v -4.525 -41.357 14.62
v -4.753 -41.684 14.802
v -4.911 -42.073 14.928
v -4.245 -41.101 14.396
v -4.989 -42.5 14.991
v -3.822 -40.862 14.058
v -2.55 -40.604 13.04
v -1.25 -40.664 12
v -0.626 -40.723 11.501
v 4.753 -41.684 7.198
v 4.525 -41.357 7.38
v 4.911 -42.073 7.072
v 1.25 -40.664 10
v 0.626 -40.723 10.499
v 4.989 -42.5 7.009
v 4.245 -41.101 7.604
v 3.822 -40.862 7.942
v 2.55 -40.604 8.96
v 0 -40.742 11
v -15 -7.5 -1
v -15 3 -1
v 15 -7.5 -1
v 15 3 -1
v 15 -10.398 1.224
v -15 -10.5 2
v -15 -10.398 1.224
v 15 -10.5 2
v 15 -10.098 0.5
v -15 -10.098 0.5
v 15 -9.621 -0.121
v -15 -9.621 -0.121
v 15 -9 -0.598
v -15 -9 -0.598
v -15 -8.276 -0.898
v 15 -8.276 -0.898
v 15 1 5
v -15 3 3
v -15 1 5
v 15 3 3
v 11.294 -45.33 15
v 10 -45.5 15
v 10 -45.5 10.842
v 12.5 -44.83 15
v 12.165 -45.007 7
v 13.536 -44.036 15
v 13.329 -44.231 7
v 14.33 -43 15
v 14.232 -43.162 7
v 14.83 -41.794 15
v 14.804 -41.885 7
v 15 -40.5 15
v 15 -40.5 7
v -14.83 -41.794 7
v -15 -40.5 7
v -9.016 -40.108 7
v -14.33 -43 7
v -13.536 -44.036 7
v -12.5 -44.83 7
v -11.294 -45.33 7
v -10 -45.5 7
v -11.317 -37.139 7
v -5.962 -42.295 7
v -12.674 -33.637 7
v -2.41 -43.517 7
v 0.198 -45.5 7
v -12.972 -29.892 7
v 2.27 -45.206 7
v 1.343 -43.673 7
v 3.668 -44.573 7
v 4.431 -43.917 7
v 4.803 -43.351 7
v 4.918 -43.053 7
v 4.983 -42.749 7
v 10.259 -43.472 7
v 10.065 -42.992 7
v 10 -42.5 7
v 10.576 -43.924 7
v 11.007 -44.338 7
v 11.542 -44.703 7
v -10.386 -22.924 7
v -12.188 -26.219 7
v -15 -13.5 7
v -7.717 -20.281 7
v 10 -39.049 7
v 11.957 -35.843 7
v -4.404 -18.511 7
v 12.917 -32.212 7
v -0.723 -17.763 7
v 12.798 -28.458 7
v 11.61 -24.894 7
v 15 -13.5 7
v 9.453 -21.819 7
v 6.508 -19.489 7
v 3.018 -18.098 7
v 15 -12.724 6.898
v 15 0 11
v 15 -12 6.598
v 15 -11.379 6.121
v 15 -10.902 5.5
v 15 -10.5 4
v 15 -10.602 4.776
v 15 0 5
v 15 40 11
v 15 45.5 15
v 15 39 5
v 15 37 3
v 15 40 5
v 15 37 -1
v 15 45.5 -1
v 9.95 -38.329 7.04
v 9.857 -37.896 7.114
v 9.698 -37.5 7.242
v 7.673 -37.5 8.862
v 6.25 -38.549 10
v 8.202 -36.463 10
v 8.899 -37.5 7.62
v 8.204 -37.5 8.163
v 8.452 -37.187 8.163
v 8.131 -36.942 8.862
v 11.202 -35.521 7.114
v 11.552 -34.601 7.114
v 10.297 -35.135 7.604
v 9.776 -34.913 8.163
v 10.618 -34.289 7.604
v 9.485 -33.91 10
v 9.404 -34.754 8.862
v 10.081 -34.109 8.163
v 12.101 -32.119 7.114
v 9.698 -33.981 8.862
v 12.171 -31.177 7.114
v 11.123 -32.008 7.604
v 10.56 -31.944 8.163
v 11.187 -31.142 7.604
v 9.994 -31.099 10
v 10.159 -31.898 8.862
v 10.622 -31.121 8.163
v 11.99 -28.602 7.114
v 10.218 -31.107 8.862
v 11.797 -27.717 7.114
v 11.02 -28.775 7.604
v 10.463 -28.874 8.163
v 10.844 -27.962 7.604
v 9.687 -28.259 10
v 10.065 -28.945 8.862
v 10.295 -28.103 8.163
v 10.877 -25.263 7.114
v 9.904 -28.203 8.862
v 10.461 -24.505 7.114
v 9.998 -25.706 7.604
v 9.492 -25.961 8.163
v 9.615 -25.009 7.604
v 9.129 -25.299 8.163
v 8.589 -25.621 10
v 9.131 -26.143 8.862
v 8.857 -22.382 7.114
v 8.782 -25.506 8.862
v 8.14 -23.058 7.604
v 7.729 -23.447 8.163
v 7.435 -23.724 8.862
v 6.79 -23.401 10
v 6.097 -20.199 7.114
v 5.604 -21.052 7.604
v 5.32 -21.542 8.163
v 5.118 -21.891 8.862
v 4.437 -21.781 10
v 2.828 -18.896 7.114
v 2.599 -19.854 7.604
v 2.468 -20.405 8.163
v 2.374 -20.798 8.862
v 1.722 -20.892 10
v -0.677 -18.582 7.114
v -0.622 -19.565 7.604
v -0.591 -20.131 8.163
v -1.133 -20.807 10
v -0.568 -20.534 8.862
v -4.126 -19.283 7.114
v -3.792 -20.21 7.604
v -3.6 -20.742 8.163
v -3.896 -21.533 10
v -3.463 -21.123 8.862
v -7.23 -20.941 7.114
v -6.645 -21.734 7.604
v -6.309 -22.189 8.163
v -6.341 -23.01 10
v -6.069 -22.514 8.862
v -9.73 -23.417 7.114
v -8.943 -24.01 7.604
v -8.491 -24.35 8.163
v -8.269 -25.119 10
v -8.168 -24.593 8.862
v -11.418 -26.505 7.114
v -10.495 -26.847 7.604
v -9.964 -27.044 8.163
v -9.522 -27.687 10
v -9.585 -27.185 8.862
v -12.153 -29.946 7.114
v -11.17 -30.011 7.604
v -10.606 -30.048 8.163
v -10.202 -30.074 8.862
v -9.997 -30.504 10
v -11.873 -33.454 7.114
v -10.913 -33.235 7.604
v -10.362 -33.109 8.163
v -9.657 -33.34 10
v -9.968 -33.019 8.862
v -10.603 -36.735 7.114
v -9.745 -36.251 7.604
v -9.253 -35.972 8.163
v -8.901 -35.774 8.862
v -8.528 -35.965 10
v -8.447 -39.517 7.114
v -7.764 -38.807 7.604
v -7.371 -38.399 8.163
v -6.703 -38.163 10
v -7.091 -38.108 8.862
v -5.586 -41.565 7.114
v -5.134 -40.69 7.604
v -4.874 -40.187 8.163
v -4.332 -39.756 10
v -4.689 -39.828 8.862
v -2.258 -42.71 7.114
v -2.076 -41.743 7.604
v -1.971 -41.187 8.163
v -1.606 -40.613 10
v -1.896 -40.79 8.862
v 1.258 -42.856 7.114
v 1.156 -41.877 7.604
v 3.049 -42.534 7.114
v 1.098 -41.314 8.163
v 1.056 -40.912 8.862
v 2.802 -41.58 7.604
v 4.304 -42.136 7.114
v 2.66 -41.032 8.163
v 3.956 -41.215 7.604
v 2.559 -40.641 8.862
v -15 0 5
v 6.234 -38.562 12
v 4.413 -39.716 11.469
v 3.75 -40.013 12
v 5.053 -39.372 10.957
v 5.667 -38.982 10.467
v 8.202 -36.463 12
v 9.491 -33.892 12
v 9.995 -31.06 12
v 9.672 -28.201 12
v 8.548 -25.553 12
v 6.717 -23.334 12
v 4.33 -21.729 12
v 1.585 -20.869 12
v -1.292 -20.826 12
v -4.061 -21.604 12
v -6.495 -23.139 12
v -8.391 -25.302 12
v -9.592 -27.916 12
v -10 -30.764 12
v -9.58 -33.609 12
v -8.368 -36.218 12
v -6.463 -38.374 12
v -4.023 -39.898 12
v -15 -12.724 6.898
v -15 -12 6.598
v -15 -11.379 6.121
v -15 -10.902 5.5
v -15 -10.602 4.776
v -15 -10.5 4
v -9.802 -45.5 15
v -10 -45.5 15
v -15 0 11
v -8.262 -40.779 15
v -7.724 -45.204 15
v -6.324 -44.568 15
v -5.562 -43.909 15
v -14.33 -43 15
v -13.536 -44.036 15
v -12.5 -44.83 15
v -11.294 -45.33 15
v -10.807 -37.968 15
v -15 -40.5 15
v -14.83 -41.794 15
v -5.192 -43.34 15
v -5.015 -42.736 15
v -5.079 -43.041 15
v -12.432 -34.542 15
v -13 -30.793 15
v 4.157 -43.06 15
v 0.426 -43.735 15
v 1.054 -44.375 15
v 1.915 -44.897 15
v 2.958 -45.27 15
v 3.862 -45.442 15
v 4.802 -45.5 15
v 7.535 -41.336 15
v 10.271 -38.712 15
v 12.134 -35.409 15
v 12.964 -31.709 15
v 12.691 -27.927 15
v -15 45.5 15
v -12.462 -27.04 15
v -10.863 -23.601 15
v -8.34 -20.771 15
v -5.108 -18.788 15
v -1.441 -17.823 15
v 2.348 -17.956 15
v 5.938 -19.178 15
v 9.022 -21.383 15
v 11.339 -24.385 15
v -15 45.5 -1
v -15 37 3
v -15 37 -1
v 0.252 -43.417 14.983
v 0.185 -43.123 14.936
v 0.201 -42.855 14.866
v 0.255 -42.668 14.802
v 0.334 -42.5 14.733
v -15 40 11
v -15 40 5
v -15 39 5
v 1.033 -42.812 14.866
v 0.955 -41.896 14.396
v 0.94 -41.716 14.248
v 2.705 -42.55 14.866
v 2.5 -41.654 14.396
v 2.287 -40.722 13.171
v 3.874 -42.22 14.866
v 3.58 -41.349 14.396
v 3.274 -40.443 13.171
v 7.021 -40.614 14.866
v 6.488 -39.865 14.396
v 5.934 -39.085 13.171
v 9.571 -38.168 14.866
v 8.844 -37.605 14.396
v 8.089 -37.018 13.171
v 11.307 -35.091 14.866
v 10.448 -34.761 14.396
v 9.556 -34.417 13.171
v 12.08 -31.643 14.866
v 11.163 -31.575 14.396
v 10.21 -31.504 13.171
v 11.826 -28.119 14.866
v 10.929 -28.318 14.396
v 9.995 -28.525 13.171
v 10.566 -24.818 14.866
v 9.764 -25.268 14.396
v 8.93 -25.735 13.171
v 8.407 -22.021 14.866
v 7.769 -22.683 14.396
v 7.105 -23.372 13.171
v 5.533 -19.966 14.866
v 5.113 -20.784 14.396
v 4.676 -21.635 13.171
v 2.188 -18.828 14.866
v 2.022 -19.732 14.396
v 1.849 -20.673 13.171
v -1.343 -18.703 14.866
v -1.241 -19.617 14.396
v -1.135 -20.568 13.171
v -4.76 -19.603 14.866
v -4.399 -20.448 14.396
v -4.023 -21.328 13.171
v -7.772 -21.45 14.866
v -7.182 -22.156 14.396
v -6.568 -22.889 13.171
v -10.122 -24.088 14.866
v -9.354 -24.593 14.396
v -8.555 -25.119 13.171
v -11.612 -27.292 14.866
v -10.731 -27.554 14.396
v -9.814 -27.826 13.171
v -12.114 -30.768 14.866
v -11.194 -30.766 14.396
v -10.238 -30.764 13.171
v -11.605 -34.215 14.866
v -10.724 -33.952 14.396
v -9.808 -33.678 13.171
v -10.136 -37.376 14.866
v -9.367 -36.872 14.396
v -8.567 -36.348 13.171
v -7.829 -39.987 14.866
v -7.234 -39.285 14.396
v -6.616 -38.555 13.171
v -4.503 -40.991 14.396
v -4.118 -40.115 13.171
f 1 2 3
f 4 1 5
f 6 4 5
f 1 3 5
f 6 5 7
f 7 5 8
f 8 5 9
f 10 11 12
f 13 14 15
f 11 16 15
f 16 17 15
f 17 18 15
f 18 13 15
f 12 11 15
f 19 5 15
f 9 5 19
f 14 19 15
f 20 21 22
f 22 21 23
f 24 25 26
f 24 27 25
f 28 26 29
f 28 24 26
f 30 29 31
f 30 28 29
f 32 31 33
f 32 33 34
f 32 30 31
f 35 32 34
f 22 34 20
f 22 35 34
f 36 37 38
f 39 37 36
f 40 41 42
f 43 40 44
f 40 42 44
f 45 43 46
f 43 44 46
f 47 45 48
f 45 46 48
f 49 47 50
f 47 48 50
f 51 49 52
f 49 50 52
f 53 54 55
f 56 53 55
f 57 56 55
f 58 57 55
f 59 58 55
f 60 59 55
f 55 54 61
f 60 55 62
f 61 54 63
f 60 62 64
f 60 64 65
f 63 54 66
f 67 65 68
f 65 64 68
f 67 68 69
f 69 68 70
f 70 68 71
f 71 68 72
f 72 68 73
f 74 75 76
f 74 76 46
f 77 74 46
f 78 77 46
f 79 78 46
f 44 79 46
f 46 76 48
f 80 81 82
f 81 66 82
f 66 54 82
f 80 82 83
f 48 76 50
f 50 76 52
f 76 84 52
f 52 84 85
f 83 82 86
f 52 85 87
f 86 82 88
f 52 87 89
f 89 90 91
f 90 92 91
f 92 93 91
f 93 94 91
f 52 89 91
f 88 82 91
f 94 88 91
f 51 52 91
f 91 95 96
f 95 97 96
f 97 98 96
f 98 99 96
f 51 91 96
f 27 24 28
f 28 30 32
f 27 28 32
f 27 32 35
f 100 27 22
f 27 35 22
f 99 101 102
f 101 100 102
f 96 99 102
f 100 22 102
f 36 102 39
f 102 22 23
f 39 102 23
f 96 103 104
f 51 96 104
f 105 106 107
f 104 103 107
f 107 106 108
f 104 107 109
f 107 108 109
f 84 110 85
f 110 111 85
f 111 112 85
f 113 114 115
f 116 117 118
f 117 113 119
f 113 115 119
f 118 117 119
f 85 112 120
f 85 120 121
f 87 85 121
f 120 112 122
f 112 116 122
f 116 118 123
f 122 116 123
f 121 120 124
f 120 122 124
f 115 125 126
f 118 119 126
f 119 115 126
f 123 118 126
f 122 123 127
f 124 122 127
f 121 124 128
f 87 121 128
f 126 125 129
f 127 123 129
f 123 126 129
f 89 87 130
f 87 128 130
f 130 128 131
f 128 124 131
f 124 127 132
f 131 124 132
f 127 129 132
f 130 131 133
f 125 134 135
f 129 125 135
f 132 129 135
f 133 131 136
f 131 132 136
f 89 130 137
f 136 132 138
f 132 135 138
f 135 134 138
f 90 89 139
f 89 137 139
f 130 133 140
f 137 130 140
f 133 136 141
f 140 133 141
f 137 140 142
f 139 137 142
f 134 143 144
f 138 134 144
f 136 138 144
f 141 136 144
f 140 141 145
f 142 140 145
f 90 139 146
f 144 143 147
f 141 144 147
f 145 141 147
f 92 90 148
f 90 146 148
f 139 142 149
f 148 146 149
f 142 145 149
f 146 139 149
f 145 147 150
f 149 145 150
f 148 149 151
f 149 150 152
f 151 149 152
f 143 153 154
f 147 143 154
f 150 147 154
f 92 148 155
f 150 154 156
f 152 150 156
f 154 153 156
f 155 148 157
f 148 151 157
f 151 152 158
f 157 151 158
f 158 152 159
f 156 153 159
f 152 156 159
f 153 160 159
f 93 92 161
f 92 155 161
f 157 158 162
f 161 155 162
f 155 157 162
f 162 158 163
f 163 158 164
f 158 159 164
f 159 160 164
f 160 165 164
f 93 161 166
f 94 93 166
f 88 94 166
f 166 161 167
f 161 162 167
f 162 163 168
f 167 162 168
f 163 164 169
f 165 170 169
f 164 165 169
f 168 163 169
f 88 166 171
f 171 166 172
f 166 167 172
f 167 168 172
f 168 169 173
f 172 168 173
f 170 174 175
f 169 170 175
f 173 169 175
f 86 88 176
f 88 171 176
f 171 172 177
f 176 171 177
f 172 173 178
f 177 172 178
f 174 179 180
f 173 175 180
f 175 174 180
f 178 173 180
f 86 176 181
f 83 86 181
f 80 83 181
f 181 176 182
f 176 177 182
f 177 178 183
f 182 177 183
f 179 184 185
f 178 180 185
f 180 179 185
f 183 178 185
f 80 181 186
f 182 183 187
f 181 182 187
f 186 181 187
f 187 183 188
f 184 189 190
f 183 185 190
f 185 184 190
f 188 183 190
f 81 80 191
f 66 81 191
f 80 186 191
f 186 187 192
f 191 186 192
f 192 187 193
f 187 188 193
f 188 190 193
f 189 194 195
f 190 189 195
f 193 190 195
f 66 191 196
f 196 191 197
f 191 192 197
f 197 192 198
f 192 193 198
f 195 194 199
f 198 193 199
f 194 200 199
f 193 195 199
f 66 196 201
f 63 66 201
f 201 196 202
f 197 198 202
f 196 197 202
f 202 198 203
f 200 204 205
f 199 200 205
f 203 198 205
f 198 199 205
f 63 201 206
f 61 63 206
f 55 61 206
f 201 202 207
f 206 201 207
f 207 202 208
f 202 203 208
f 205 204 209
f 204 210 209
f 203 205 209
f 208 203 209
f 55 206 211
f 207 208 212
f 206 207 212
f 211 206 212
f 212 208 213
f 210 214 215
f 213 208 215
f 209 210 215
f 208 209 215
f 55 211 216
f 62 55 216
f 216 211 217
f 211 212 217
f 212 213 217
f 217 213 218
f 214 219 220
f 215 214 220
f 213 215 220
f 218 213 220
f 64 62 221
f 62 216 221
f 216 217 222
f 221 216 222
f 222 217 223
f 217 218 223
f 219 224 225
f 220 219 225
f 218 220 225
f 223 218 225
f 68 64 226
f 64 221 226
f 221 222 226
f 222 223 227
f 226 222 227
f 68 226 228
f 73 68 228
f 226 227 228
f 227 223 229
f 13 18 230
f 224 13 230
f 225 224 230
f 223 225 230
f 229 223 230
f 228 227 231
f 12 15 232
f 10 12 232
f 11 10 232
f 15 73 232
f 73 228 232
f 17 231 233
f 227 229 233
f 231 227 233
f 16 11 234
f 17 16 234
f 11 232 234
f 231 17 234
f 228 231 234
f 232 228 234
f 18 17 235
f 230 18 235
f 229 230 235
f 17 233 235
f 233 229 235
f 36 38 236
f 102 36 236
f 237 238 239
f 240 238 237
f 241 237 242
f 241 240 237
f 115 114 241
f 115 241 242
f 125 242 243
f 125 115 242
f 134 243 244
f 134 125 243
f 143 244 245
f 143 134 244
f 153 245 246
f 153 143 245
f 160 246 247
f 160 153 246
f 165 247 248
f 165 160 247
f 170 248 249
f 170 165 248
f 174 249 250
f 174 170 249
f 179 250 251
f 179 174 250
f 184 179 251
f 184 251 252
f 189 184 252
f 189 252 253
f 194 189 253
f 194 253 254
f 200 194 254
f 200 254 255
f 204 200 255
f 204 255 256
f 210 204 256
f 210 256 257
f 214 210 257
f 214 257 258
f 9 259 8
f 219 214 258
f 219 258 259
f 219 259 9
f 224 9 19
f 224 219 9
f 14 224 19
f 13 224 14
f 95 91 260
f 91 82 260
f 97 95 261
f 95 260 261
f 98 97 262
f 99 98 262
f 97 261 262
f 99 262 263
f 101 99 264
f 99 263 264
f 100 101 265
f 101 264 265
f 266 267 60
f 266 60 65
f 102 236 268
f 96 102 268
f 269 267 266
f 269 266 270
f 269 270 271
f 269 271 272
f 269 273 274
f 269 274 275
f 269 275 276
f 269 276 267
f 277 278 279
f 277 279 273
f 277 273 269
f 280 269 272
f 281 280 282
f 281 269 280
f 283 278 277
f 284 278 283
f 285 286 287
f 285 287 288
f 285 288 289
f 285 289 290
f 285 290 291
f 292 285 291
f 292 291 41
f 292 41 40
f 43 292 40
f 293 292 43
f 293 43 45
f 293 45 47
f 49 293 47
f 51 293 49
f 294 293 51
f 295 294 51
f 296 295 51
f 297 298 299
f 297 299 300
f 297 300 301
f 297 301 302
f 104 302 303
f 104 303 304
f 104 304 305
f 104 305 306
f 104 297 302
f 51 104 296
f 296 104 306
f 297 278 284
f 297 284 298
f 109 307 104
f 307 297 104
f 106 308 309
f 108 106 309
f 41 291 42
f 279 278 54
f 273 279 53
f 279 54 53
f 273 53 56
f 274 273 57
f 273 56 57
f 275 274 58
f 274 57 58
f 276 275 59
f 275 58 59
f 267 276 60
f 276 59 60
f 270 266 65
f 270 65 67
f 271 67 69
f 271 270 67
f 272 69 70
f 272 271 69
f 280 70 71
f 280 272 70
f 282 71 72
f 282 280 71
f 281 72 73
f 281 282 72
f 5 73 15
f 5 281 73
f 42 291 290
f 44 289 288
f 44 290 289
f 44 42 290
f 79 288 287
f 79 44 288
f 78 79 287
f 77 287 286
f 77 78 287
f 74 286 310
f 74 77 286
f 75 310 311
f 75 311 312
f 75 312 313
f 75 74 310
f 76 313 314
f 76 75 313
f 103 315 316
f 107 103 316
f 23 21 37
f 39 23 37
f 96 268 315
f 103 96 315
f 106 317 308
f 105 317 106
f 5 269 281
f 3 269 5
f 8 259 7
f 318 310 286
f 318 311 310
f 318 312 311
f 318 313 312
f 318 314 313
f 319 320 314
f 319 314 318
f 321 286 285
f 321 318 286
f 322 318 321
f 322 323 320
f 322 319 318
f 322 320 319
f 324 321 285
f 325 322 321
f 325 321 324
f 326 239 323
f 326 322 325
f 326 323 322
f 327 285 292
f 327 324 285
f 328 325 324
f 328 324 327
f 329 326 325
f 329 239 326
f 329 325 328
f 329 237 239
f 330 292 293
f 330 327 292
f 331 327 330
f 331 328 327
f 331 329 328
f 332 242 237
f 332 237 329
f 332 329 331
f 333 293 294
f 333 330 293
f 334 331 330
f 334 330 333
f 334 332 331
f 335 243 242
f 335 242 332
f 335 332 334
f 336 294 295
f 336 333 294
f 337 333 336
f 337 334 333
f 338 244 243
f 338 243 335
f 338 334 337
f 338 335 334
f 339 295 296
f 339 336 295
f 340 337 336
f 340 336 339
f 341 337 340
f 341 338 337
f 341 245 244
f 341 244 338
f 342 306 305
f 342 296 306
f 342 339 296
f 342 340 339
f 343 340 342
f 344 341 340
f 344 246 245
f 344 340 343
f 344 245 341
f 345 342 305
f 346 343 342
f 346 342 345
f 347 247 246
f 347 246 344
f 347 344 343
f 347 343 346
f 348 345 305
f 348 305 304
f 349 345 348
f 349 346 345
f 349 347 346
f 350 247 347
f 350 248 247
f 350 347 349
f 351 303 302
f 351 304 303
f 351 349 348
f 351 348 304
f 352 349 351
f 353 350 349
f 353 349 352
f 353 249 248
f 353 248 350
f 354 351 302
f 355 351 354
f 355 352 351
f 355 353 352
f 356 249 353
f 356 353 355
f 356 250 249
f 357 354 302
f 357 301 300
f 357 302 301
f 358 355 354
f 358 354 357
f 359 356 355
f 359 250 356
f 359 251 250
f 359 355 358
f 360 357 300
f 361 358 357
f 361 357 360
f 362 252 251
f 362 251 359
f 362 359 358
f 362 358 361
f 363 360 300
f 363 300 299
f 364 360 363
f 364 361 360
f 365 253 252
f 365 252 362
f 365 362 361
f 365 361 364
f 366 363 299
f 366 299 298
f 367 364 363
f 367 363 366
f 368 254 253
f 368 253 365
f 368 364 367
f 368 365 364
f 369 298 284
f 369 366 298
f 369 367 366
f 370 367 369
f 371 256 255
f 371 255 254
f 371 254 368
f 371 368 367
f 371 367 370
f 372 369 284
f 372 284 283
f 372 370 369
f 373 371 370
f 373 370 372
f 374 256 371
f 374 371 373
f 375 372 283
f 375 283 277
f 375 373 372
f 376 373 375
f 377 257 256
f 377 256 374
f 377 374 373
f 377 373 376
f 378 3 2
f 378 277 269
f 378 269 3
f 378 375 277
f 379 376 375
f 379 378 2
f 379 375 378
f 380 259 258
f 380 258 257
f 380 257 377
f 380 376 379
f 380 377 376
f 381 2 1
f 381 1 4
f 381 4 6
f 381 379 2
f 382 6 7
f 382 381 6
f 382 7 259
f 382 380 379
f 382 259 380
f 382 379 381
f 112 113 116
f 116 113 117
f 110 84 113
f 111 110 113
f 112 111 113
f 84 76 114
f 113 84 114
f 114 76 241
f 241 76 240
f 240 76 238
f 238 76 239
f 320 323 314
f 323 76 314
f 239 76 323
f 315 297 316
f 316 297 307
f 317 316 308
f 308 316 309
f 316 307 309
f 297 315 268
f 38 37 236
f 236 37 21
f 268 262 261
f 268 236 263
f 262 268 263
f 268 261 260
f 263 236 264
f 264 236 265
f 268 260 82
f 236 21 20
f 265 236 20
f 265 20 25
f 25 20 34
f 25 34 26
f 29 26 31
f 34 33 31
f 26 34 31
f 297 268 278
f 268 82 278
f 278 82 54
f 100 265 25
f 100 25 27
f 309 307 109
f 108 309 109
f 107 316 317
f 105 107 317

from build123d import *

# Parameters (mm, degrees)
F0_W          = 30
F0_H          = 56
F1_DEPTH      = 15
F1_DEPTH_BACK = 1
F2_START      = 7
F0_R          = 10
F2_DEPTH      = 8
F3_R          = 3
F4_R          = 3
F6_DEPTH      = 8
F7_T1_DEPTH   = 27.8062484749
F7_T3_DEPTH   = 27.8062484749
F9_DEPTH      = 30
F10_SIZE      = 2


# Not quite as in the source:
# - a fillet or chamfer that OpenCascade refuses, or shapes differently, is made with other operations: its cross-section is extruded or revolved along the edge and cut away or added


with BuildPart() as f1:
    # F0 (on Top) → F1 (new body, two sides)
    with BuildSketch(Plane.XY) as f1_sk:
        with Locations((0, 17.5)):
            Rectangle(F0_W, F0_H)
    extrude(amount=F1_DEPTH)
    extrude(f1_sk.sketch, amount=-F1_DEPTH_BACK)

    # F0 (on Top) → F2 (join)
    with BuildSketch(Plane.XY.offset(F2_START)):
        with BuildLine():
            Line((15, -40.5), (15, -10.5))
            Line((15, -10.5), (-15, -10.5))
            Line((-15, -10.5), (-15, -40.5))
            ThreePointArc((-15, -40.5), (-13.5355339059, -44.0355339059), (-10, -45.5))
            Line((-10, -45.5), (10, -45.5))
            ThreePointArc((10, -45.5), (13.5355339059, -44.0355339059), (15, -40.5))
        make_face()
        with Locations((0, -30.7424795181)):
            Circle(F0_R, mode=Mode.SUBTRACT)
    extrude(amount=F2_DEPTH)

    # F3
    f3_edges = [f1.edges().sort_by_distance(p)[0] for p in [
        (0, -10.5, 7),
        (0, -10.5, -1),
    ]]
    fillet(f3_edges, radius=F3_R)

    # F4
    f4_edges = [f1.edges().sort_by_distance(p)[0] for p in [
        (-10, -30.74248, 15),
        (-10, -30.74248, 7),
    ]]
    fillet(f4_edges, radius=F4_R)

    # F5 (on face) → F6 (cut)
    with BuildSketch(Plane.XZ.offset(45.5)):
        Polygon((10, 7), (0, 15), (-5, 15), (5, 7), align=None)
    extrude(amount=-F6_DEPTH, mode=Mode.SUBTRACT)

    # F7: fillet of radius 3 on 2 edges, made by hand

    # F7_s2 → F7_t1 (cut)
    with BuildSketch(Plane(origin=(-16.2223697294, 0, 12.9778957835), x_dir=(0, 1, 0), z_dir=(0.7808688094, 0, -0.6246950476))):
        with BuildLine():
            ThreePointArc((-45.5, 5.5895569039), (-44.6213203436, 7.7108772474), (-42.5, 8.5895569039))
            Line((-42.5, 8.5895569039), (-45.5, 8.5895569039))
            Line((-45.5, 8.5895569039), (-45.5, 5.5895569039))
        make_face()
    extrude(amount=F7_T1_DEPTH, mode=Mode.SUBTRACT)

    # F7_s4 → F7_t3 (cut)
    with BuildSketch(Plane(origin=(8.5394429001, 0, -6.8315543201), x_dir=(0, 1, 0), z_dir=(-0.7808688094, 0, 0.6246950476))):
        with BuildLine():
            ThreePointArc((-45.5, -14.7130321416), (-44.6213203436, -12.5917117981), (-42.5, -11.7130321416))
            Line((-42.5, -11.7130321416), (-45.5, -11.7130321416))
            Line((-45.5, -11.7130321416), (-45.5, -14.7130321416))
        make_face()
    extrude(amount=F7_T3_DEPTH, mode=Mode.SUBTRACT)

    # F8 (on face) → F9 (cut, through all)
    with BuildSketch(Plane(origin=(-15, 0, 0), x_dir=(0, -1, 0), z_dir=(-1, 0, 0))):
        Polygon((0, 5), (0, 11), (-40, 11), (-40, 10), (-40, 5), (-37, 5), (-37, -1), (-3, -1), (-3, 5), align=None)
    extrude(amount=-F9_DEPTH, mode=Mode.SUBTRACT)

    # F10
    f10_edges = [f1.edges().sort_by_distance(p)[0] for p in [
        (0, 37, 5),
        (0, 3, 5),
    ]]
    chamfer(f10_edges, length=F10_SIZE)


solid = f1.part
